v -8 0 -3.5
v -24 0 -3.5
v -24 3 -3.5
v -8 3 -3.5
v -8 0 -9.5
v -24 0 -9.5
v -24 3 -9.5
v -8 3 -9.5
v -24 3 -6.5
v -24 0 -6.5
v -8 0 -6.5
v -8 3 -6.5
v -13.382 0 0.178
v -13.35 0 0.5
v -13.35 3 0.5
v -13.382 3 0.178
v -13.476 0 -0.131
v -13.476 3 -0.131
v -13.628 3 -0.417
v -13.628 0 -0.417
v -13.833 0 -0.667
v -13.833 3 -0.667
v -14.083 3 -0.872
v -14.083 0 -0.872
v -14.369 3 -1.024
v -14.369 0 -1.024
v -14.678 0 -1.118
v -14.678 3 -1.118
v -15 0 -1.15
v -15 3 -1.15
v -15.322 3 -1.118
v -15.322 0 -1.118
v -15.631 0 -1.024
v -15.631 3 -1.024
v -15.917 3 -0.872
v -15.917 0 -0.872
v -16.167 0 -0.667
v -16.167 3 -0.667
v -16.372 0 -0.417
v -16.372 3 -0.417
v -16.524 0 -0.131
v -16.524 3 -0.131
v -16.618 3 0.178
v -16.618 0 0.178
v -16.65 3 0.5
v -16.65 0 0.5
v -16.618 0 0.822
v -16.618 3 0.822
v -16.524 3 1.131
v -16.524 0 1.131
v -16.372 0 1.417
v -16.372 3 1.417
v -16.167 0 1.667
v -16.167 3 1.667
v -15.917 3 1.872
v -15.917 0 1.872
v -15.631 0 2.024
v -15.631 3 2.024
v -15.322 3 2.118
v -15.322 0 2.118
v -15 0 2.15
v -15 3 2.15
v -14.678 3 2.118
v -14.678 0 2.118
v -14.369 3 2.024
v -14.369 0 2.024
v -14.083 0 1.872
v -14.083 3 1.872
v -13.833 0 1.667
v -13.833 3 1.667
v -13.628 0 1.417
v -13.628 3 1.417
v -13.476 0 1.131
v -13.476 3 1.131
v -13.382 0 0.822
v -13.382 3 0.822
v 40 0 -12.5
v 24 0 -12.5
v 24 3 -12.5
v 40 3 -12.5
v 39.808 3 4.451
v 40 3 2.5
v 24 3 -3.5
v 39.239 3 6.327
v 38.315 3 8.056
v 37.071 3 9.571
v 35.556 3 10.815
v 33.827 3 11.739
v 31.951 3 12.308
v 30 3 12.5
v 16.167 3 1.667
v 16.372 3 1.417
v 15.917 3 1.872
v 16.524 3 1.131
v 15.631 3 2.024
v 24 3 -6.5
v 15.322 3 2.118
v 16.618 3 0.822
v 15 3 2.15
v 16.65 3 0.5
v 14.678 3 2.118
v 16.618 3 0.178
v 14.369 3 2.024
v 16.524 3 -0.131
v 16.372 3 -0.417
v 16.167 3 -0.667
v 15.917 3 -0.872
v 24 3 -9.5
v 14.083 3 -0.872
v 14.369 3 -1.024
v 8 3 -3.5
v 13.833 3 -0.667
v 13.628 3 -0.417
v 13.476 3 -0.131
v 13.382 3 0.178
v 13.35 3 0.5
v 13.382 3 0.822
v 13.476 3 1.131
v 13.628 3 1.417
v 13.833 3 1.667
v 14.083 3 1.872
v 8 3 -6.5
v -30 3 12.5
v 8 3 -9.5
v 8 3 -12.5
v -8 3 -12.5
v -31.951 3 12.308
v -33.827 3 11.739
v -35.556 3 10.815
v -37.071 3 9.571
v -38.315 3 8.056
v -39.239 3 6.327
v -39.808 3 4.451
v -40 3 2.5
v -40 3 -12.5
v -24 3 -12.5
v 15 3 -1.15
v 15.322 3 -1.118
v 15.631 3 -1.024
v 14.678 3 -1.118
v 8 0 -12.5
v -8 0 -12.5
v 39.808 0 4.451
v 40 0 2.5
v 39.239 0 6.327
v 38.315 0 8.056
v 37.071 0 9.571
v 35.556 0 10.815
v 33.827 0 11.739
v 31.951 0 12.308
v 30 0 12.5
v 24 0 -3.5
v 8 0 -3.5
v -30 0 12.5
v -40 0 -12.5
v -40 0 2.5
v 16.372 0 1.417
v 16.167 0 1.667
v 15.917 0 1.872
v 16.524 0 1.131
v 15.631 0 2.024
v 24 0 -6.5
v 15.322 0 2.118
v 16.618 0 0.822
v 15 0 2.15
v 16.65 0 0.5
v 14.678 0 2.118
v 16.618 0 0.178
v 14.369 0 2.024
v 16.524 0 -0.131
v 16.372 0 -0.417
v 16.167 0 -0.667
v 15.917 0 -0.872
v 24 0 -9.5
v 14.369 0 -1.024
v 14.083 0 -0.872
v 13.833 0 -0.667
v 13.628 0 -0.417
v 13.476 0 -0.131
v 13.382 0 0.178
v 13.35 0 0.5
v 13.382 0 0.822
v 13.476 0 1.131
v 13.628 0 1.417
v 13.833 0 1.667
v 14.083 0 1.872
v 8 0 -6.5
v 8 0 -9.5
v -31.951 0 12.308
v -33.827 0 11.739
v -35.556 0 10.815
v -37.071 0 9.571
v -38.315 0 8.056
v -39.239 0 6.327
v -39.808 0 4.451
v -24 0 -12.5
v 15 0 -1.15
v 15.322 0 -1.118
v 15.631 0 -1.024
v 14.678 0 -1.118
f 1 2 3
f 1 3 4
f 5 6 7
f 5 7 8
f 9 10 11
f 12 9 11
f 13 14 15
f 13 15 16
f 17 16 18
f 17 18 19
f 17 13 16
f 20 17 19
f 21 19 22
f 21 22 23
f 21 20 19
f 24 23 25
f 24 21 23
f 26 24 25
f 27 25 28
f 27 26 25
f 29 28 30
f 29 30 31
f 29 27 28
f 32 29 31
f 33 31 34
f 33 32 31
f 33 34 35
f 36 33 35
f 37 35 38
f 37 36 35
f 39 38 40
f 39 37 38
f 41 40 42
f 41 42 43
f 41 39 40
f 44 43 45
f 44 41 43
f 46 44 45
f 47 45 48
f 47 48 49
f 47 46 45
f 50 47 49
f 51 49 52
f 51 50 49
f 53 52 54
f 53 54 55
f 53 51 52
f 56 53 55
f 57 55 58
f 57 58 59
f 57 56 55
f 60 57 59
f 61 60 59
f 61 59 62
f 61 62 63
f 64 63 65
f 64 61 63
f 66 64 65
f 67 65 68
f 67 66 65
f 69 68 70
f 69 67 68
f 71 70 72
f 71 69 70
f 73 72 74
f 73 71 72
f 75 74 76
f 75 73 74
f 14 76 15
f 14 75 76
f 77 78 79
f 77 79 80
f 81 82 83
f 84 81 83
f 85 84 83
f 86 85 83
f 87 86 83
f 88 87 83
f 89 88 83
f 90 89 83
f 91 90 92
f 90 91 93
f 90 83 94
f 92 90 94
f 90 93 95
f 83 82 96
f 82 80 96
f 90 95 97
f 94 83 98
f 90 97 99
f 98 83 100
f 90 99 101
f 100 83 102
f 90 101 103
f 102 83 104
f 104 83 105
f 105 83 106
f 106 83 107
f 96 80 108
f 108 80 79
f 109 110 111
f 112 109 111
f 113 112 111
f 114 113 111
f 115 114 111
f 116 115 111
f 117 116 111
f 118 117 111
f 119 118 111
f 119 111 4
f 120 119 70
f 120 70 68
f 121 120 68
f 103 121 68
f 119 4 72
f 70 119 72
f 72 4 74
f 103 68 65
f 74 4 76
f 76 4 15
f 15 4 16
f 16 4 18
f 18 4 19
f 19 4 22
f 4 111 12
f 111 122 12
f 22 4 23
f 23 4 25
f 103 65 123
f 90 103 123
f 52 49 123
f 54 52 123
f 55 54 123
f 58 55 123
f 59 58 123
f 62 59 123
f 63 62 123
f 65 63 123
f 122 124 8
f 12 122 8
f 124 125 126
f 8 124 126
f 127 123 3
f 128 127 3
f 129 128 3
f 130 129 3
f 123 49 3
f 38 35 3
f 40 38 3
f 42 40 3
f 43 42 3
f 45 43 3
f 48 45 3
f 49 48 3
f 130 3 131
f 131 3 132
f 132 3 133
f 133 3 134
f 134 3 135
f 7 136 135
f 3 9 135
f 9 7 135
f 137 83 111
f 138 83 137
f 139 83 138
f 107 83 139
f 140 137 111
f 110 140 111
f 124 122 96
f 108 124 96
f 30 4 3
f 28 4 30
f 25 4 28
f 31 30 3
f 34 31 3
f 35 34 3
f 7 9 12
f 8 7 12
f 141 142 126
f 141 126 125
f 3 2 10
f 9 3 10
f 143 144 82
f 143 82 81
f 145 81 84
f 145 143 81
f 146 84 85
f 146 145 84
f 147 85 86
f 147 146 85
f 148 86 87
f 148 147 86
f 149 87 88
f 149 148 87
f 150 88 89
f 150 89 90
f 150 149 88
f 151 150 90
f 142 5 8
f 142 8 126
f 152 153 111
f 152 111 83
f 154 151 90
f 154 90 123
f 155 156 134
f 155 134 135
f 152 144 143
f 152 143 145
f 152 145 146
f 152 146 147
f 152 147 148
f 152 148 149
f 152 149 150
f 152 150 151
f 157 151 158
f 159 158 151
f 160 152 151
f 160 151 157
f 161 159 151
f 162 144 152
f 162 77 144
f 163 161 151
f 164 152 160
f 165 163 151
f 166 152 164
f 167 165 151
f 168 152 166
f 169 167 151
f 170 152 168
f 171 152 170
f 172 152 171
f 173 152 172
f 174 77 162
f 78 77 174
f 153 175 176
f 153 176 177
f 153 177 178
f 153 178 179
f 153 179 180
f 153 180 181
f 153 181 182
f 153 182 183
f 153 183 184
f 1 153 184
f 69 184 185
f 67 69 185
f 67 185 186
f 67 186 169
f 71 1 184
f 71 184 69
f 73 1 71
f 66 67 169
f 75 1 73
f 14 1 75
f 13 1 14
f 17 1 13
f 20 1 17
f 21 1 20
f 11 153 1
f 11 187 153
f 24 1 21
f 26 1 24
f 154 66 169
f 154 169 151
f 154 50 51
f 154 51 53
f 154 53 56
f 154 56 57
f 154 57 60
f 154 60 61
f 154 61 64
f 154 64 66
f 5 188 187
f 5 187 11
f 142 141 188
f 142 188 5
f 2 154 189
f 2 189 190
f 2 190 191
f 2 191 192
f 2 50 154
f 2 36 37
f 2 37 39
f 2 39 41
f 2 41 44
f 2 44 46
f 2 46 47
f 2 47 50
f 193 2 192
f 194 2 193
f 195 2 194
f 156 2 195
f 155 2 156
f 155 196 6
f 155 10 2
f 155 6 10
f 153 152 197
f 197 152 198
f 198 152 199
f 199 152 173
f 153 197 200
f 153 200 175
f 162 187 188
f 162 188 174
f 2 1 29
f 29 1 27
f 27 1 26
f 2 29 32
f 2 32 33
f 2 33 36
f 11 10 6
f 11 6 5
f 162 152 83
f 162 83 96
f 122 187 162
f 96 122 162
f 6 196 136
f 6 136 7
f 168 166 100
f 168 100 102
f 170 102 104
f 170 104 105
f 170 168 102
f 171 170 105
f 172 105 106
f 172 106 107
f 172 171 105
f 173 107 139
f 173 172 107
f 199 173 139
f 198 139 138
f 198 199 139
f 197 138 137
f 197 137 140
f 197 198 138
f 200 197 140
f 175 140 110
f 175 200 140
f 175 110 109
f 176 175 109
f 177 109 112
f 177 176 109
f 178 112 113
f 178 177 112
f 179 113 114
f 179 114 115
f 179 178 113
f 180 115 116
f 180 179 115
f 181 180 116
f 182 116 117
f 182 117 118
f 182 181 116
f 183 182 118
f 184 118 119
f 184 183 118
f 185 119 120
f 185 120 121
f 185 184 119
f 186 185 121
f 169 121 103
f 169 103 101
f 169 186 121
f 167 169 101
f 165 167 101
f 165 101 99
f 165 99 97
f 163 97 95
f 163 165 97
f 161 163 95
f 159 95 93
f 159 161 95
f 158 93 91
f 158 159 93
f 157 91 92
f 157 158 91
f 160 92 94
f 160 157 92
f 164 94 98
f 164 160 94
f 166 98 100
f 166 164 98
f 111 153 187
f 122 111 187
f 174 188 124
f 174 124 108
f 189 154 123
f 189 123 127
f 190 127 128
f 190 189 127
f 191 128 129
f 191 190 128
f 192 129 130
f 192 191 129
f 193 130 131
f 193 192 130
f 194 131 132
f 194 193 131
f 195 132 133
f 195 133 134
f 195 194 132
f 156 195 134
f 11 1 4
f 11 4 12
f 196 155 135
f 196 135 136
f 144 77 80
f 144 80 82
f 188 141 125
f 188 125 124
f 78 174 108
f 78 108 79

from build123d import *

# Parameters (mm, degrees)
SKETCH1_R           = 1.65
SKETCH1_W           = 16
SKETCH1_H           = 3
BOSS_EXTRUDE1_DEPTH = 3


with BuildPart() as part:
    # Sketch1 → Boss-Extrude1 (new body)
    with BuildSketch(Plane(origin=(0, 0, 0), x_dir=(1, 0, 0), z_dir=(0, 1, 0))):
        with BuildLine():
            Line((30, -12.5), (-30, -12.5))
            ThreePointArc((-30, -12.5), (-37.071067812, -9.571067812), (-40, -2.5))
            Line((-40, -2.5), (-40, 12.5))
            Line((-40, 12.5), (-24, 12.5))
            Line((-24, 12.5), (-24, 9.5))
            Line((-24, 9.5), (-8, 9.5))
            Line((-8, 9.5), (-8, 12.5))
            Line((-8, 12.5), (8, 12.5))
            Line((8, 12.5), (8, 9.5))
            Line((8, 9.5), (24, 9.5))
            Line((24, 9.5), (24, 12.5))
            Line((24, 12.5), (40, 12.5))
            Line((40, 12.5), (40, -2.5))
            ThreePointArc((40, -2.5), (37.071067812, -9.571067812), (30, -12.5))
        make_face()
        with Locations((-15, -0.5)):
            Circle(SKETCH1_R, mode=Mode.SUBTRACT)
        with Locations((15, -0.5)):
            Circle(SKETCH1_R, mode=Mode.SUBTRACT)
        with Locations((-16, 5)):
            Rectangle(SKETCH1_W, SKETCH1_H, mode=Mode.SUBTRACT)
        with Locations((16, 5)):
            Rectangle(SKETCH1_W, SKETCH1_H, mode=Mode.SUBTRACT)
    extrude(amount=BOSS_EXTRUDE1_DEPTH)


solid = part.part
